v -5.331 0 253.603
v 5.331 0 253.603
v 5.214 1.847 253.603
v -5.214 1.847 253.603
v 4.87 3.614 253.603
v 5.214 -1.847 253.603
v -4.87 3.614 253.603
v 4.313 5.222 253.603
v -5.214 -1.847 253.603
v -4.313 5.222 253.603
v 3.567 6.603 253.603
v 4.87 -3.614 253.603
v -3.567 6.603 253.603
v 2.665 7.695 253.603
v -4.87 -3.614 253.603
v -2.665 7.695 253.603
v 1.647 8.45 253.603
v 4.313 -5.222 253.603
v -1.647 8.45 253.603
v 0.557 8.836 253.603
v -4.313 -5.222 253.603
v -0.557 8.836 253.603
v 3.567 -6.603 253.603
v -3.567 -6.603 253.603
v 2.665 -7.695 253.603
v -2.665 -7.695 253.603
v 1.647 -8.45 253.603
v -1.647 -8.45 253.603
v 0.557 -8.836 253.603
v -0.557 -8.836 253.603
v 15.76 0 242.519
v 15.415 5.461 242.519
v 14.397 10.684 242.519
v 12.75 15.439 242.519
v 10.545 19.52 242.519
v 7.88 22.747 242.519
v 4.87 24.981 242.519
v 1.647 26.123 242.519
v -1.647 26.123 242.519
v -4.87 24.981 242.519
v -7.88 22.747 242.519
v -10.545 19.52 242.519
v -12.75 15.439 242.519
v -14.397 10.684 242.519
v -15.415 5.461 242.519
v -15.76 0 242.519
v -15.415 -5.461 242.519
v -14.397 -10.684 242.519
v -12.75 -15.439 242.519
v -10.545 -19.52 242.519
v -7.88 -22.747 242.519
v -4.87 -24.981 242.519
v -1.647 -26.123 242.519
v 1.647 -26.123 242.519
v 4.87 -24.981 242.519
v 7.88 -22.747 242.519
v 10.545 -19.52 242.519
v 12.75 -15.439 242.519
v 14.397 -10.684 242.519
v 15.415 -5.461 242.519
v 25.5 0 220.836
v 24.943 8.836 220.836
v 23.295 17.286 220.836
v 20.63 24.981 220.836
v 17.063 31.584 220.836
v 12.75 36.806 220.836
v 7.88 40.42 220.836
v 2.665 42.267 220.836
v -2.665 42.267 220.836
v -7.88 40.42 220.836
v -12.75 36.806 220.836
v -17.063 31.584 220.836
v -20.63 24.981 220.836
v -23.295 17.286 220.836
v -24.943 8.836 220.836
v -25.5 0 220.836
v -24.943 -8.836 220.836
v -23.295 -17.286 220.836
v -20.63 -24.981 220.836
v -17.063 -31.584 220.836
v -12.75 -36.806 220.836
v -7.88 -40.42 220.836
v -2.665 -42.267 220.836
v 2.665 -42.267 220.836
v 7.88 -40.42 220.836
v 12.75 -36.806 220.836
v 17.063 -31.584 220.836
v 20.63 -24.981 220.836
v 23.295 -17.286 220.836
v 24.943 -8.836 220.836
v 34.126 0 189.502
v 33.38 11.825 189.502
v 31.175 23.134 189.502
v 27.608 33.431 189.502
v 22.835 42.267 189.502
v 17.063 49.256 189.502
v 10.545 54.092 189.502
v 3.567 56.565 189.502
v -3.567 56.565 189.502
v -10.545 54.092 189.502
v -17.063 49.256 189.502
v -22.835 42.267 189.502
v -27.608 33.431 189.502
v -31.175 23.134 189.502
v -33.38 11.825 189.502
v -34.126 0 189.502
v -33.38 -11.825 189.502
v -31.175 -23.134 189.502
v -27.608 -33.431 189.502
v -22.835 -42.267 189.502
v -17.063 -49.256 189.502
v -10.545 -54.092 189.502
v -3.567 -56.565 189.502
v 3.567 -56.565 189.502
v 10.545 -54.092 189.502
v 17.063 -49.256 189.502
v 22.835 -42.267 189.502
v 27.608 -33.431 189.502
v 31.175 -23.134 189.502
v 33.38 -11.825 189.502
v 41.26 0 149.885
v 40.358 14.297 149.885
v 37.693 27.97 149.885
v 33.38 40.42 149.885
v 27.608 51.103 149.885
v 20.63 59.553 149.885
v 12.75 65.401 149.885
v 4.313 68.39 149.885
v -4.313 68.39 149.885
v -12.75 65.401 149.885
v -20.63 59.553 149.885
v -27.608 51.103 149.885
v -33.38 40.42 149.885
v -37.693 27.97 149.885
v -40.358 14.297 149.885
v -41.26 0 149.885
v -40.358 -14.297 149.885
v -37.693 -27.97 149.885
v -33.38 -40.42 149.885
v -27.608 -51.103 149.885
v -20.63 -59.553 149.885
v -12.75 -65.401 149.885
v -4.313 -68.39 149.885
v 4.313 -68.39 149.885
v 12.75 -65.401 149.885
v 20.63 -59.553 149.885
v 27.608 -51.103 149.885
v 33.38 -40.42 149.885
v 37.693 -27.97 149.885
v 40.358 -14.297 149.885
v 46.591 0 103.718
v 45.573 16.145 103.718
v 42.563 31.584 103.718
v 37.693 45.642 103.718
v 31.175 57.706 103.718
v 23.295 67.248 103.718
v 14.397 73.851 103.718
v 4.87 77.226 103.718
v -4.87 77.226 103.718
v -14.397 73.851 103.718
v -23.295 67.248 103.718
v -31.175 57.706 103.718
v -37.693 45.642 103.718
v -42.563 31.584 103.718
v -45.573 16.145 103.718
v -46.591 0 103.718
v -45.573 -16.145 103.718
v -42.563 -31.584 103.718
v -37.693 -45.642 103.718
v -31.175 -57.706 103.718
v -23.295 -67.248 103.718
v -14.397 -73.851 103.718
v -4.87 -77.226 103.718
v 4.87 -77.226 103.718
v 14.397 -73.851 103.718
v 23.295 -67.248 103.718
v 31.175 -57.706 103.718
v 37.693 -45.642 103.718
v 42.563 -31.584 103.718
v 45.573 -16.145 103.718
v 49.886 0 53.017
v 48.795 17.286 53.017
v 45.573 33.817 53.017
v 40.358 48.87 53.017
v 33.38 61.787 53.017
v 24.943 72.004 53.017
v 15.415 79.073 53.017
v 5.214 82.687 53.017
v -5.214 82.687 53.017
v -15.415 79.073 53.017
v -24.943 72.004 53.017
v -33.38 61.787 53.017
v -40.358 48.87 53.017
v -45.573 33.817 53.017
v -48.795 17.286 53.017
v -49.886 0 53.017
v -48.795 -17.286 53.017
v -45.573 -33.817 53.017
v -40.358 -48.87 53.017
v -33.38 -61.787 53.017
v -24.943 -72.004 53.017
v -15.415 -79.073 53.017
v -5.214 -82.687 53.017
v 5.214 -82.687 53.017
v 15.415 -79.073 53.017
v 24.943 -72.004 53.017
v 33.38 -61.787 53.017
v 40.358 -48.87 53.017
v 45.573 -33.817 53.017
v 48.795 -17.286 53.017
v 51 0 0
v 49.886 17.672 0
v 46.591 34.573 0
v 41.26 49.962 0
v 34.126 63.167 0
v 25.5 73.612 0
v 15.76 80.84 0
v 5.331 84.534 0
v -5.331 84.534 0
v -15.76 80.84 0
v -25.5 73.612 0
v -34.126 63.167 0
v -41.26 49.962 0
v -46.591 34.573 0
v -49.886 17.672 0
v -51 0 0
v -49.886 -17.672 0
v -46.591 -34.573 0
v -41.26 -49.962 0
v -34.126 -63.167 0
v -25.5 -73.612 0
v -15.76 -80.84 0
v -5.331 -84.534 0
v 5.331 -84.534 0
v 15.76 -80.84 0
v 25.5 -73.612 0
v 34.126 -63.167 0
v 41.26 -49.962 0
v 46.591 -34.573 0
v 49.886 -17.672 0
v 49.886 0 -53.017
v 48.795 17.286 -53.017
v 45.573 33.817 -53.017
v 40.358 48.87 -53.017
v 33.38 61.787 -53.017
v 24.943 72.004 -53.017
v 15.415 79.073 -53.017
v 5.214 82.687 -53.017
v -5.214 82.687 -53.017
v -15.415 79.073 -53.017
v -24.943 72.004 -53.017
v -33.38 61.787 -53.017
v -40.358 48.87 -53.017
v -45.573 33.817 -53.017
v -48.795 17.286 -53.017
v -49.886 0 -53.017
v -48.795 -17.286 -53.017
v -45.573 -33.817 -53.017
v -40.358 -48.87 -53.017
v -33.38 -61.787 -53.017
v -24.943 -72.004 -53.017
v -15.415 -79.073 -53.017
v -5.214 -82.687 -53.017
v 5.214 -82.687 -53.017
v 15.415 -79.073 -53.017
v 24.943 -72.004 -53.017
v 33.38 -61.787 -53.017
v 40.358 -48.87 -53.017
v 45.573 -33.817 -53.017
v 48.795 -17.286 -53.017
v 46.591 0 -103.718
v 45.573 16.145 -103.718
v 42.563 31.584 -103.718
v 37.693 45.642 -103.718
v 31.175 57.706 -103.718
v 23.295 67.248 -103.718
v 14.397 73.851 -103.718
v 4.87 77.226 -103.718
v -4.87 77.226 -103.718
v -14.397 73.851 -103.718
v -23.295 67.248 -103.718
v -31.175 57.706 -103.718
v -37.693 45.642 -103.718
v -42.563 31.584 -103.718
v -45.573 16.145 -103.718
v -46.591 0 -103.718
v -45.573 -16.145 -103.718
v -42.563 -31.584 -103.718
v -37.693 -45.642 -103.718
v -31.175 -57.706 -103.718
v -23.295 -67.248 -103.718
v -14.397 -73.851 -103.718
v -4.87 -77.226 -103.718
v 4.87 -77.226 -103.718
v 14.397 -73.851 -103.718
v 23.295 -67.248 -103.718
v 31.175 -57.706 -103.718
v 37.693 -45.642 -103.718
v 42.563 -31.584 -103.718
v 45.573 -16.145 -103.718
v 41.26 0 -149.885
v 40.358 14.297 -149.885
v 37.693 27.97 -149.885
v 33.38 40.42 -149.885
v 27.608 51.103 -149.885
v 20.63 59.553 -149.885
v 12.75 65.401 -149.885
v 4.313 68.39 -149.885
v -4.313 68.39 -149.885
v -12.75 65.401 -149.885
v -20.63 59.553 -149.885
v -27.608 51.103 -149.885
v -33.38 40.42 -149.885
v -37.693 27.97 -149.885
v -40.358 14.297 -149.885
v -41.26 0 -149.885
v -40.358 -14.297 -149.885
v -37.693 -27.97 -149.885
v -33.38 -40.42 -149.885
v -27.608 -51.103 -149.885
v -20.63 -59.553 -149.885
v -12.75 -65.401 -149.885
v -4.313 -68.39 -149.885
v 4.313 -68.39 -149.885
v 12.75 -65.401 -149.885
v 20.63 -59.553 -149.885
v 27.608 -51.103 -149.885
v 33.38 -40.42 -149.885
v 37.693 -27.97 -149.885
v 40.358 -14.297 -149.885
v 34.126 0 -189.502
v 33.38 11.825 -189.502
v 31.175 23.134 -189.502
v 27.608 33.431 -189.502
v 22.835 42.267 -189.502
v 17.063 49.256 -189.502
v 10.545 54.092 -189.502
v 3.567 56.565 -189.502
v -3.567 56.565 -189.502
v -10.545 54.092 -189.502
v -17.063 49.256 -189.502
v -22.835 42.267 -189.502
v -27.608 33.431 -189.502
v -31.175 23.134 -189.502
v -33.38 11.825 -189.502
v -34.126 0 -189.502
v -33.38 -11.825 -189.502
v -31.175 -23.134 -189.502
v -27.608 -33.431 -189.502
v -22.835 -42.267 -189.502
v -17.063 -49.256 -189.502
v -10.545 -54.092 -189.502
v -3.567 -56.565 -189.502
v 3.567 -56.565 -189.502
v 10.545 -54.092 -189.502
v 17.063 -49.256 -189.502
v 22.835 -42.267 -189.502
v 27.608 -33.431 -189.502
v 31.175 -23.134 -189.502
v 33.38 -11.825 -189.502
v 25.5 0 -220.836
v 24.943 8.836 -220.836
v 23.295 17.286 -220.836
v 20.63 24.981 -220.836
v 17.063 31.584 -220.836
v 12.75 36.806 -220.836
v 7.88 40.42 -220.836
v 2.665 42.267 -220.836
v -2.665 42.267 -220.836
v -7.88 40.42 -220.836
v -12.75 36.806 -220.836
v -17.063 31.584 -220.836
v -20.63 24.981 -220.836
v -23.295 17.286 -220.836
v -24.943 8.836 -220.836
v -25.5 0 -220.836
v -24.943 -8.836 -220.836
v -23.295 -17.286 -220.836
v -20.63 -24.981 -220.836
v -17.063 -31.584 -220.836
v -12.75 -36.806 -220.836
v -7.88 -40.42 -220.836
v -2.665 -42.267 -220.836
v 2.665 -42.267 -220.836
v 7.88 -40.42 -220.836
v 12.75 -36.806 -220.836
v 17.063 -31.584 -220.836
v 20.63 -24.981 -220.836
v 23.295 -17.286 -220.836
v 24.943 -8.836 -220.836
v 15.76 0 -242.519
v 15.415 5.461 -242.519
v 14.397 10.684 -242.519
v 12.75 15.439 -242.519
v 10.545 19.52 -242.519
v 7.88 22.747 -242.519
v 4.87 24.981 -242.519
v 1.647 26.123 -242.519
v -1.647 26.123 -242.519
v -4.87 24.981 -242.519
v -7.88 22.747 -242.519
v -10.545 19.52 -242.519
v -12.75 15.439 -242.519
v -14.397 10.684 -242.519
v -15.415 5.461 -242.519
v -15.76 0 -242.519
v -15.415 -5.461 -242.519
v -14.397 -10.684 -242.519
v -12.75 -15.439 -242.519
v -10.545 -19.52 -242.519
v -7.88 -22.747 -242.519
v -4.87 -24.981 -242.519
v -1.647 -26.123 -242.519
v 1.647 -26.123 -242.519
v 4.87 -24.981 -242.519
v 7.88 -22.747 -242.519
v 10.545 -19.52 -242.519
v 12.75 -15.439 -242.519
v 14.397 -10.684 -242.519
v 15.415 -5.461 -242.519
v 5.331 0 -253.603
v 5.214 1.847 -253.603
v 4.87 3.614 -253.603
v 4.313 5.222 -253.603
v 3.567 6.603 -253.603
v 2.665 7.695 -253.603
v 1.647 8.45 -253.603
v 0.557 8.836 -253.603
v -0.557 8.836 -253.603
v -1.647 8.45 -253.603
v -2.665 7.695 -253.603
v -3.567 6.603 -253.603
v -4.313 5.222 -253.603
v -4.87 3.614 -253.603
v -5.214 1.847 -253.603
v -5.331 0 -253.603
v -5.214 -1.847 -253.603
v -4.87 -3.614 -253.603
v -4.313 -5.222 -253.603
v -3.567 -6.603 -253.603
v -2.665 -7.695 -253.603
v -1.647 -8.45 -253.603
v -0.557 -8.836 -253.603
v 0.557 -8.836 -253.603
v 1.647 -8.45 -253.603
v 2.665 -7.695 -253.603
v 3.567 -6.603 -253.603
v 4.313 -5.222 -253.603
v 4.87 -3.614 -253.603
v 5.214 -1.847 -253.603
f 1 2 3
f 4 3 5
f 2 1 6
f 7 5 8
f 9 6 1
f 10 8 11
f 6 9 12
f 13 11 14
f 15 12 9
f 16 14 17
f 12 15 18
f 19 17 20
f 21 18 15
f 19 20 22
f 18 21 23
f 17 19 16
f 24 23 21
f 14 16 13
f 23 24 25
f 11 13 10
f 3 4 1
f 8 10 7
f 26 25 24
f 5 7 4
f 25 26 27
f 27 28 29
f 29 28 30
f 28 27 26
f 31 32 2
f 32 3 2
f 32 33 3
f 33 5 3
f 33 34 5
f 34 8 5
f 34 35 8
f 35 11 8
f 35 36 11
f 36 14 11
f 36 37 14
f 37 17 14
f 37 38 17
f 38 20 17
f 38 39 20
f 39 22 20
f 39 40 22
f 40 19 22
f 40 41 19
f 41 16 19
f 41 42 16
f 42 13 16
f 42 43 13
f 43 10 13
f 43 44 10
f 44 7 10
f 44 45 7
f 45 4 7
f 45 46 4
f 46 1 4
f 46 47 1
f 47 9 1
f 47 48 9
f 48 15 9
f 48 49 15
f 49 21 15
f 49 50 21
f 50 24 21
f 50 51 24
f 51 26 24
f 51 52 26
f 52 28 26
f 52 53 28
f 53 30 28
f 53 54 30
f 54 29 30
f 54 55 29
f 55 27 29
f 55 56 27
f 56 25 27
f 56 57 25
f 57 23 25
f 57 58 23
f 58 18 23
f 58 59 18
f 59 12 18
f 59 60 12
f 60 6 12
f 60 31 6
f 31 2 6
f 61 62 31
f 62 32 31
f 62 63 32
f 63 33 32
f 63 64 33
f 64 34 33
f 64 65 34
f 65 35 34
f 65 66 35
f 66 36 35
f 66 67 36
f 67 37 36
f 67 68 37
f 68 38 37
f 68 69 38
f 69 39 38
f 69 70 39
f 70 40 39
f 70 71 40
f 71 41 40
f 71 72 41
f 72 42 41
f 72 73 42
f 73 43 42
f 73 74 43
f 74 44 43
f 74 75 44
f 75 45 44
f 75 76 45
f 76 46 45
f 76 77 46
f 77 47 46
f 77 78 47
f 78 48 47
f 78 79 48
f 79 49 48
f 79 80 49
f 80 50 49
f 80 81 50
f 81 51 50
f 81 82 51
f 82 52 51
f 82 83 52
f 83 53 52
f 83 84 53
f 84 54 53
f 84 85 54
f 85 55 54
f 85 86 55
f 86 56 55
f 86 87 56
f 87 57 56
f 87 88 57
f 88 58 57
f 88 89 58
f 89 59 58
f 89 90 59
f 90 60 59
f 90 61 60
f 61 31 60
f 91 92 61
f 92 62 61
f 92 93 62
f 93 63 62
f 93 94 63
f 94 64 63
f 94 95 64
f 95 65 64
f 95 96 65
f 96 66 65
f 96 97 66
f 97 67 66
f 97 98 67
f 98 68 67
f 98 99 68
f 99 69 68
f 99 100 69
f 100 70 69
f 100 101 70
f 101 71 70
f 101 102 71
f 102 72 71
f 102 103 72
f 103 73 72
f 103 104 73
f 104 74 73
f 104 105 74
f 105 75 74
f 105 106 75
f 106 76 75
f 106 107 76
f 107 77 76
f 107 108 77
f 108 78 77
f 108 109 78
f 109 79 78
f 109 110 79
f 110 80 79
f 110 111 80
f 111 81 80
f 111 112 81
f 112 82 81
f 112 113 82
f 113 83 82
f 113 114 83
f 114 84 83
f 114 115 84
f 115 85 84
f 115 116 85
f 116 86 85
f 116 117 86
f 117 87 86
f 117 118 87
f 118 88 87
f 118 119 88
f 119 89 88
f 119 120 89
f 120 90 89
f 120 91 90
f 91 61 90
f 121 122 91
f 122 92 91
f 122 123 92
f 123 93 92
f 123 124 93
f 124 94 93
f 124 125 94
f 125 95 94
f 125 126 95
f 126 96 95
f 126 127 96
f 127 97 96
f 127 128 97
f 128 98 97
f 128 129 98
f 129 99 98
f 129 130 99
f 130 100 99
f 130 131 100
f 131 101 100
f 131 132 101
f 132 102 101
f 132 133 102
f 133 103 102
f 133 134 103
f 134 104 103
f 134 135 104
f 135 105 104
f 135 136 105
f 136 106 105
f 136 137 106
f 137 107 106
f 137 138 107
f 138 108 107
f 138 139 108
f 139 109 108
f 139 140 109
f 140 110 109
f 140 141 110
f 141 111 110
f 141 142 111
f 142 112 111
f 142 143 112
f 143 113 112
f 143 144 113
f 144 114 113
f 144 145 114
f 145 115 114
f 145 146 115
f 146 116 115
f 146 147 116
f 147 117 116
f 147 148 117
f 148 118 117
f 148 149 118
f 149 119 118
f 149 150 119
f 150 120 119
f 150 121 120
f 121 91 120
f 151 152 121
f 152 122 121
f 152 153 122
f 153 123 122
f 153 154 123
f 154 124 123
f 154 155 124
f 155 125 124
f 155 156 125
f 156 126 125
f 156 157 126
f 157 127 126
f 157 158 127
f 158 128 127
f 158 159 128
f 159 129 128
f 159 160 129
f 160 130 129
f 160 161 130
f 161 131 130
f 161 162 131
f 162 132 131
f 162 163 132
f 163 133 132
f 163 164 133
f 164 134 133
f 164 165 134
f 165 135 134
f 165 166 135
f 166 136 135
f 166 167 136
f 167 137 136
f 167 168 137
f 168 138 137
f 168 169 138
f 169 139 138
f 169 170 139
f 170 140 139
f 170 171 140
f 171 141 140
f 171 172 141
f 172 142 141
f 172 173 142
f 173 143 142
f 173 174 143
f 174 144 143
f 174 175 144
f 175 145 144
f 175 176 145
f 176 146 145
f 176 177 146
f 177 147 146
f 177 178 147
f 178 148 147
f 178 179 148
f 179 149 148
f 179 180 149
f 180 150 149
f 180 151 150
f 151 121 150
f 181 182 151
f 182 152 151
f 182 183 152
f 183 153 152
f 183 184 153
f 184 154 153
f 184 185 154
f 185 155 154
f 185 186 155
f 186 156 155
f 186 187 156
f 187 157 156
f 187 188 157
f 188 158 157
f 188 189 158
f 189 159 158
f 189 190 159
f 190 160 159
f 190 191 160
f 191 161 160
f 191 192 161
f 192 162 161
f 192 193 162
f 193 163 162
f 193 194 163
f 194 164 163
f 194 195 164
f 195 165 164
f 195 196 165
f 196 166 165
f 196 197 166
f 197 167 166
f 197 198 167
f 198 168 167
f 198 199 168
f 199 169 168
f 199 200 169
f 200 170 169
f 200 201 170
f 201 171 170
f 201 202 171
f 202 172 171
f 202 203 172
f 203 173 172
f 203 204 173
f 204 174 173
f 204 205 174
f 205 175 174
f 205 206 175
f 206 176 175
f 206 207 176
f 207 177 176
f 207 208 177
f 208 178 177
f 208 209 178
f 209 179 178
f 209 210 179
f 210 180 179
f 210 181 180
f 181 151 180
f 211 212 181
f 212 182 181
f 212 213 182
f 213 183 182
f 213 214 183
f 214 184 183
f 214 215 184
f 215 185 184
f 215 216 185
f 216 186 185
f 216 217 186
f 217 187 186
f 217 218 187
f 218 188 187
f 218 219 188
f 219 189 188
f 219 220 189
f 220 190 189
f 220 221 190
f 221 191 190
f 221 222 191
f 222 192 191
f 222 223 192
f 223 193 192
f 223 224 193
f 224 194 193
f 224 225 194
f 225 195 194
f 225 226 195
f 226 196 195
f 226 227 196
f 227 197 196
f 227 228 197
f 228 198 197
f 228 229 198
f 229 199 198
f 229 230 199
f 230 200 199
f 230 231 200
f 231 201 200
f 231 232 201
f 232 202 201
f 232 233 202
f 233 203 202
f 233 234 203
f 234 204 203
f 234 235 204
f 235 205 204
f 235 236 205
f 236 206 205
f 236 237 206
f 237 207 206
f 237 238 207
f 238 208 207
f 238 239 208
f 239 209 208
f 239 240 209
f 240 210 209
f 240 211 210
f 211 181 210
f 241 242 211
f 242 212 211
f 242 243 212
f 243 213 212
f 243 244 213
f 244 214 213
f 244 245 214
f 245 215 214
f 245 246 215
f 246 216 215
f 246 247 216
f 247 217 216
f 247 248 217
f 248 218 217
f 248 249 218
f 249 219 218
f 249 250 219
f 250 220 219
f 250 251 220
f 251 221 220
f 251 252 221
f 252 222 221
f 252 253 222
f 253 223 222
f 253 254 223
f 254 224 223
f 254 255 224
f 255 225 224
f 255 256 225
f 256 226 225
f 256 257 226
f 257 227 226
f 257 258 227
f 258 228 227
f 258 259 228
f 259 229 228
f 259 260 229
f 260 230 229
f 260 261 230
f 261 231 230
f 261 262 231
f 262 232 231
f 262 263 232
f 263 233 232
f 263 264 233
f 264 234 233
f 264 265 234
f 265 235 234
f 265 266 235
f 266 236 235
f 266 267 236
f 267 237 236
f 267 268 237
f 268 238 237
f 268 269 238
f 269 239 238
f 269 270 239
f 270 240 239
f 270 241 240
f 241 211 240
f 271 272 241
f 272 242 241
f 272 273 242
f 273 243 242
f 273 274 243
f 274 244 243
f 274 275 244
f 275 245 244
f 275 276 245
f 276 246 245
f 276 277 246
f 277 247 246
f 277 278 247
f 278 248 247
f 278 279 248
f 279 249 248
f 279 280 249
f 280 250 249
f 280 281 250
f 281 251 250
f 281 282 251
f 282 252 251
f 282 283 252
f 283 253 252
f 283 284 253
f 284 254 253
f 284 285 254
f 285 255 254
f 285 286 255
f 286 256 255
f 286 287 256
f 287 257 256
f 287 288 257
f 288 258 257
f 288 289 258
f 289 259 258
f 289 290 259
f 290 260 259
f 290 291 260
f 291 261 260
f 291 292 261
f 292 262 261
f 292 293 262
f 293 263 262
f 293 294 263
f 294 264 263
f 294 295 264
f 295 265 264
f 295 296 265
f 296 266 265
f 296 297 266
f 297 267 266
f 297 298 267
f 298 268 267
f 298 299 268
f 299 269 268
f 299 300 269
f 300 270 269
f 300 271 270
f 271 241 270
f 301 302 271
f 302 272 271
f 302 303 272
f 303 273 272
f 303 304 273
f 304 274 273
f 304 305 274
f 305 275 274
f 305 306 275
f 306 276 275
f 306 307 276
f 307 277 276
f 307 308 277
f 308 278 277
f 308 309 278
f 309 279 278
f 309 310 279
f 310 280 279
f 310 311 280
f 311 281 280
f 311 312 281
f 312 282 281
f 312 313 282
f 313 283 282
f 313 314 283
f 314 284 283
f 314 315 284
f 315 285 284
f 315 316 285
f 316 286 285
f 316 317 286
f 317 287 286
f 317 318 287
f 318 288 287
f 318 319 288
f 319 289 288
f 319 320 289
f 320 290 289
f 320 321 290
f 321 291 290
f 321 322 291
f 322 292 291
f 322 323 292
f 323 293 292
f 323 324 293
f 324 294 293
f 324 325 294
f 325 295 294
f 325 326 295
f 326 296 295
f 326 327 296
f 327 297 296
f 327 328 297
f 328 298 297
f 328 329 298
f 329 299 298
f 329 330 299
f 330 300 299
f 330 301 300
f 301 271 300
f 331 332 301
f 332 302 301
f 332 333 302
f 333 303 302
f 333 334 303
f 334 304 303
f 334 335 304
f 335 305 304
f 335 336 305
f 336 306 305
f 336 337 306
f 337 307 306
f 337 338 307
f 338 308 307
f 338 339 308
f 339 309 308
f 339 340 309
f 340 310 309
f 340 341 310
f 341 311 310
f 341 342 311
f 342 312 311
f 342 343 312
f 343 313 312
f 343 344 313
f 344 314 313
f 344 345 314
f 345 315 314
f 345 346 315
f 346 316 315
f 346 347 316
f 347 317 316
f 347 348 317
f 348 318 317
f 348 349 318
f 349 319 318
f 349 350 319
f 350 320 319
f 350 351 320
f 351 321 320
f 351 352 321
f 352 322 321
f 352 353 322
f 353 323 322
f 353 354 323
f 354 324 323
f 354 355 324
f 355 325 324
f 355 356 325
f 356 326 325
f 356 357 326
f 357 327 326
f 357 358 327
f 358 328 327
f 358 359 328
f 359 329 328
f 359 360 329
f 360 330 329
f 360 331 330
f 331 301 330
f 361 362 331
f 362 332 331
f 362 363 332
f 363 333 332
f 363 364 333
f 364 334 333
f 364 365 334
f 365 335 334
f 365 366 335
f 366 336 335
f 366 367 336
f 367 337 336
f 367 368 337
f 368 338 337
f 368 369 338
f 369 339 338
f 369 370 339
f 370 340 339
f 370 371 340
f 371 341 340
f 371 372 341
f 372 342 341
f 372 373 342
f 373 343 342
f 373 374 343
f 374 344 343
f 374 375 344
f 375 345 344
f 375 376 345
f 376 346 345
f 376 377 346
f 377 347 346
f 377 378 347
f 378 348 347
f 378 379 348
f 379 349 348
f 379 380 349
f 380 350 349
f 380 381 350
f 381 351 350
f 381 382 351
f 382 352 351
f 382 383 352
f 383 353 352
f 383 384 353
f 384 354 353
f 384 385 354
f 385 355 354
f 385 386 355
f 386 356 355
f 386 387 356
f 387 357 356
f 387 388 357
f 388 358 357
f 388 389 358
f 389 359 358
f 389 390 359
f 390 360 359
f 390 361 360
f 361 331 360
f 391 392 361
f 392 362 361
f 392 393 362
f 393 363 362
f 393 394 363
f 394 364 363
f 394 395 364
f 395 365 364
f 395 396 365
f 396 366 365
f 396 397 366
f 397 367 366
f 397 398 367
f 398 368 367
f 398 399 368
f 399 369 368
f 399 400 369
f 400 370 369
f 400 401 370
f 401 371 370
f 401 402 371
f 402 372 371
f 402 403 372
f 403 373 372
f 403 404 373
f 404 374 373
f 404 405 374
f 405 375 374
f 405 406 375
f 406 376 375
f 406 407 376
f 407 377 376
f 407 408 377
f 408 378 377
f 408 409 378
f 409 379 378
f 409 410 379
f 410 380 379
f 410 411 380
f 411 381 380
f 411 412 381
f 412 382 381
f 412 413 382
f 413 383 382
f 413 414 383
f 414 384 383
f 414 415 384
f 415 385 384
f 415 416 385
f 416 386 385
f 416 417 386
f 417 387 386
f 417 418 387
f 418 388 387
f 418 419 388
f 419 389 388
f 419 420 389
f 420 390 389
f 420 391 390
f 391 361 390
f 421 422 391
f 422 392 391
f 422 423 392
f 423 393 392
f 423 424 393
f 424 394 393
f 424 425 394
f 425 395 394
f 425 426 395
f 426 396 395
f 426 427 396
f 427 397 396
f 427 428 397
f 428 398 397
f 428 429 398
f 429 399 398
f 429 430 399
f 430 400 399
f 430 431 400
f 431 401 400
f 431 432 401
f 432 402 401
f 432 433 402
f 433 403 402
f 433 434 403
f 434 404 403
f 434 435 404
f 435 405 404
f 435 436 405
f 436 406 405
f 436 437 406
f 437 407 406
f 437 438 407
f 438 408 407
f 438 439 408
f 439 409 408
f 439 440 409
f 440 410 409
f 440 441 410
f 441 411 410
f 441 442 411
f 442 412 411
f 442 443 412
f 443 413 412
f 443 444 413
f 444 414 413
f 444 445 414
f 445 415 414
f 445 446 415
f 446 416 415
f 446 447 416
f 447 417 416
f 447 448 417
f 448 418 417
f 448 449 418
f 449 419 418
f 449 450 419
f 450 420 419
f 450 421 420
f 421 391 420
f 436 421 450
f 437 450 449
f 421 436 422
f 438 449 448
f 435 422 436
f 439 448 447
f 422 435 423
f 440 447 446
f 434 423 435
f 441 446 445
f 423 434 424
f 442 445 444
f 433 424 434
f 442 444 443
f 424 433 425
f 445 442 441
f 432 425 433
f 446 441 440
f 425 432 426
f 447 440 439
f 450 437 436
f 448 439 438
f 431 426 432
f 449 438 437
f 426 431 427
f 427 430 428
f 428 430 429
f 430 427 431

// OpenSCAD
// Generated by SolidPython 1.0.1 on 2020-07-29 00:46:45


scale(v = [3, 5, 15]) {
	sphere(r = 17);
}
/***********************************************
*********      SolidPython code:      **********
************************************************
 
# import packages: SolidPython
from solid import *
from solid.utils import *
from itertools import chain, combinations, permutations


class Resize:

    def __init__(self, scad_file):
        self.scad_file = scad_file
        #self.scad_file = import_scad(scad_file)
        # cone/cylinder param:
        self.r1 = 0
        self.r2 = 0
        self.h = 0
        # rectangular prism param:
        self.w = 0
        self.l = 0
        # ellipse param:
        self.r = 0

    # import OpenScad code (file name corresponds to shape)


    # classify shape + parameters
    def assign(self, param1, param2, param3):
        if self.scad_file == 'cone.scad':
            self.r1 = param1
            self.r2 = param2
            self.h = param3
        elif self.scad_file == 'cylinder.scad':
            self.r1 = param1
            self.r2 = param2
            self.h = param3
        elif self.scad_file == 'rectangularPrism.scad':
            self.h = param1
            self.l = param2
            self.w = param3
        else:
            self.r = param1
            self.h = param2

    # resize parameters
    def iterate(self):
        x = range(3, 20, 2)
        i = 1
        if self.scad_file == 'cone.scad':
            tempList = list(permutations(x, 2))
            for temp in tempList:
                param1 = temp[0]
                param2 = temp[1]
                filepath = 'produced_scad_files/' + 'cone' + str(param1) + '_' + str(param2) + '_' + '.scad'
                scad_render_to_file(cylinder(h=param1, r1=param2, r2=0), filepath)

        elif self.scad_file == 'cylinder.scad':
            tempList = list(permutations(x, 3))
            for temp in tempList:
                param1 = temp[0]
                param2 = temp[1]
                filepath = 'produced_scad_files/' + 'cylinder' + str(param1) + '_' + str(param2) + '_' + '.scad'
                scad_render_to_file(cylinder(h=param1, r1=param2, r2=param2), filepath)

        elif self.scad_file == 'rectangularPrism.scad':
            tempList = list(permutations(x, 3))
            for temp in tempList:
                param1 = temp[0]
                param2 = temp[1]
                param3 = temp[2]
                filepath = 'produced_scad_files/' + 'rectangularPrism' + str(param1) + '_' + str(param2) + '_' + str(
                    param3) + '.scad'
                scad_render_to_file(cube(size=(param1, param2, param3)), filepath)

        elif self.scad_file == 'ellipse.scad':
            tempList = list(permutations(x, 4))
            for temp in tempList:
                param1 = temp[0]
                param2 = temp[1]
                param3 = temp[2]
                param4 = temp[3]
                filepath = 'produced_scad_files/' + 'ellipse' + str(param1) + '_' + str(param2) + '_' + str(param3) + '_' + str(param4) + '.scad'
                scad_render_to_file(scale([param1, param2, param3])(sphere(r=param4)), filepath)

    def render_to_scadfile(self):
        scad_render_to_file(scad, 'example.scad') 
 
************************************************/
